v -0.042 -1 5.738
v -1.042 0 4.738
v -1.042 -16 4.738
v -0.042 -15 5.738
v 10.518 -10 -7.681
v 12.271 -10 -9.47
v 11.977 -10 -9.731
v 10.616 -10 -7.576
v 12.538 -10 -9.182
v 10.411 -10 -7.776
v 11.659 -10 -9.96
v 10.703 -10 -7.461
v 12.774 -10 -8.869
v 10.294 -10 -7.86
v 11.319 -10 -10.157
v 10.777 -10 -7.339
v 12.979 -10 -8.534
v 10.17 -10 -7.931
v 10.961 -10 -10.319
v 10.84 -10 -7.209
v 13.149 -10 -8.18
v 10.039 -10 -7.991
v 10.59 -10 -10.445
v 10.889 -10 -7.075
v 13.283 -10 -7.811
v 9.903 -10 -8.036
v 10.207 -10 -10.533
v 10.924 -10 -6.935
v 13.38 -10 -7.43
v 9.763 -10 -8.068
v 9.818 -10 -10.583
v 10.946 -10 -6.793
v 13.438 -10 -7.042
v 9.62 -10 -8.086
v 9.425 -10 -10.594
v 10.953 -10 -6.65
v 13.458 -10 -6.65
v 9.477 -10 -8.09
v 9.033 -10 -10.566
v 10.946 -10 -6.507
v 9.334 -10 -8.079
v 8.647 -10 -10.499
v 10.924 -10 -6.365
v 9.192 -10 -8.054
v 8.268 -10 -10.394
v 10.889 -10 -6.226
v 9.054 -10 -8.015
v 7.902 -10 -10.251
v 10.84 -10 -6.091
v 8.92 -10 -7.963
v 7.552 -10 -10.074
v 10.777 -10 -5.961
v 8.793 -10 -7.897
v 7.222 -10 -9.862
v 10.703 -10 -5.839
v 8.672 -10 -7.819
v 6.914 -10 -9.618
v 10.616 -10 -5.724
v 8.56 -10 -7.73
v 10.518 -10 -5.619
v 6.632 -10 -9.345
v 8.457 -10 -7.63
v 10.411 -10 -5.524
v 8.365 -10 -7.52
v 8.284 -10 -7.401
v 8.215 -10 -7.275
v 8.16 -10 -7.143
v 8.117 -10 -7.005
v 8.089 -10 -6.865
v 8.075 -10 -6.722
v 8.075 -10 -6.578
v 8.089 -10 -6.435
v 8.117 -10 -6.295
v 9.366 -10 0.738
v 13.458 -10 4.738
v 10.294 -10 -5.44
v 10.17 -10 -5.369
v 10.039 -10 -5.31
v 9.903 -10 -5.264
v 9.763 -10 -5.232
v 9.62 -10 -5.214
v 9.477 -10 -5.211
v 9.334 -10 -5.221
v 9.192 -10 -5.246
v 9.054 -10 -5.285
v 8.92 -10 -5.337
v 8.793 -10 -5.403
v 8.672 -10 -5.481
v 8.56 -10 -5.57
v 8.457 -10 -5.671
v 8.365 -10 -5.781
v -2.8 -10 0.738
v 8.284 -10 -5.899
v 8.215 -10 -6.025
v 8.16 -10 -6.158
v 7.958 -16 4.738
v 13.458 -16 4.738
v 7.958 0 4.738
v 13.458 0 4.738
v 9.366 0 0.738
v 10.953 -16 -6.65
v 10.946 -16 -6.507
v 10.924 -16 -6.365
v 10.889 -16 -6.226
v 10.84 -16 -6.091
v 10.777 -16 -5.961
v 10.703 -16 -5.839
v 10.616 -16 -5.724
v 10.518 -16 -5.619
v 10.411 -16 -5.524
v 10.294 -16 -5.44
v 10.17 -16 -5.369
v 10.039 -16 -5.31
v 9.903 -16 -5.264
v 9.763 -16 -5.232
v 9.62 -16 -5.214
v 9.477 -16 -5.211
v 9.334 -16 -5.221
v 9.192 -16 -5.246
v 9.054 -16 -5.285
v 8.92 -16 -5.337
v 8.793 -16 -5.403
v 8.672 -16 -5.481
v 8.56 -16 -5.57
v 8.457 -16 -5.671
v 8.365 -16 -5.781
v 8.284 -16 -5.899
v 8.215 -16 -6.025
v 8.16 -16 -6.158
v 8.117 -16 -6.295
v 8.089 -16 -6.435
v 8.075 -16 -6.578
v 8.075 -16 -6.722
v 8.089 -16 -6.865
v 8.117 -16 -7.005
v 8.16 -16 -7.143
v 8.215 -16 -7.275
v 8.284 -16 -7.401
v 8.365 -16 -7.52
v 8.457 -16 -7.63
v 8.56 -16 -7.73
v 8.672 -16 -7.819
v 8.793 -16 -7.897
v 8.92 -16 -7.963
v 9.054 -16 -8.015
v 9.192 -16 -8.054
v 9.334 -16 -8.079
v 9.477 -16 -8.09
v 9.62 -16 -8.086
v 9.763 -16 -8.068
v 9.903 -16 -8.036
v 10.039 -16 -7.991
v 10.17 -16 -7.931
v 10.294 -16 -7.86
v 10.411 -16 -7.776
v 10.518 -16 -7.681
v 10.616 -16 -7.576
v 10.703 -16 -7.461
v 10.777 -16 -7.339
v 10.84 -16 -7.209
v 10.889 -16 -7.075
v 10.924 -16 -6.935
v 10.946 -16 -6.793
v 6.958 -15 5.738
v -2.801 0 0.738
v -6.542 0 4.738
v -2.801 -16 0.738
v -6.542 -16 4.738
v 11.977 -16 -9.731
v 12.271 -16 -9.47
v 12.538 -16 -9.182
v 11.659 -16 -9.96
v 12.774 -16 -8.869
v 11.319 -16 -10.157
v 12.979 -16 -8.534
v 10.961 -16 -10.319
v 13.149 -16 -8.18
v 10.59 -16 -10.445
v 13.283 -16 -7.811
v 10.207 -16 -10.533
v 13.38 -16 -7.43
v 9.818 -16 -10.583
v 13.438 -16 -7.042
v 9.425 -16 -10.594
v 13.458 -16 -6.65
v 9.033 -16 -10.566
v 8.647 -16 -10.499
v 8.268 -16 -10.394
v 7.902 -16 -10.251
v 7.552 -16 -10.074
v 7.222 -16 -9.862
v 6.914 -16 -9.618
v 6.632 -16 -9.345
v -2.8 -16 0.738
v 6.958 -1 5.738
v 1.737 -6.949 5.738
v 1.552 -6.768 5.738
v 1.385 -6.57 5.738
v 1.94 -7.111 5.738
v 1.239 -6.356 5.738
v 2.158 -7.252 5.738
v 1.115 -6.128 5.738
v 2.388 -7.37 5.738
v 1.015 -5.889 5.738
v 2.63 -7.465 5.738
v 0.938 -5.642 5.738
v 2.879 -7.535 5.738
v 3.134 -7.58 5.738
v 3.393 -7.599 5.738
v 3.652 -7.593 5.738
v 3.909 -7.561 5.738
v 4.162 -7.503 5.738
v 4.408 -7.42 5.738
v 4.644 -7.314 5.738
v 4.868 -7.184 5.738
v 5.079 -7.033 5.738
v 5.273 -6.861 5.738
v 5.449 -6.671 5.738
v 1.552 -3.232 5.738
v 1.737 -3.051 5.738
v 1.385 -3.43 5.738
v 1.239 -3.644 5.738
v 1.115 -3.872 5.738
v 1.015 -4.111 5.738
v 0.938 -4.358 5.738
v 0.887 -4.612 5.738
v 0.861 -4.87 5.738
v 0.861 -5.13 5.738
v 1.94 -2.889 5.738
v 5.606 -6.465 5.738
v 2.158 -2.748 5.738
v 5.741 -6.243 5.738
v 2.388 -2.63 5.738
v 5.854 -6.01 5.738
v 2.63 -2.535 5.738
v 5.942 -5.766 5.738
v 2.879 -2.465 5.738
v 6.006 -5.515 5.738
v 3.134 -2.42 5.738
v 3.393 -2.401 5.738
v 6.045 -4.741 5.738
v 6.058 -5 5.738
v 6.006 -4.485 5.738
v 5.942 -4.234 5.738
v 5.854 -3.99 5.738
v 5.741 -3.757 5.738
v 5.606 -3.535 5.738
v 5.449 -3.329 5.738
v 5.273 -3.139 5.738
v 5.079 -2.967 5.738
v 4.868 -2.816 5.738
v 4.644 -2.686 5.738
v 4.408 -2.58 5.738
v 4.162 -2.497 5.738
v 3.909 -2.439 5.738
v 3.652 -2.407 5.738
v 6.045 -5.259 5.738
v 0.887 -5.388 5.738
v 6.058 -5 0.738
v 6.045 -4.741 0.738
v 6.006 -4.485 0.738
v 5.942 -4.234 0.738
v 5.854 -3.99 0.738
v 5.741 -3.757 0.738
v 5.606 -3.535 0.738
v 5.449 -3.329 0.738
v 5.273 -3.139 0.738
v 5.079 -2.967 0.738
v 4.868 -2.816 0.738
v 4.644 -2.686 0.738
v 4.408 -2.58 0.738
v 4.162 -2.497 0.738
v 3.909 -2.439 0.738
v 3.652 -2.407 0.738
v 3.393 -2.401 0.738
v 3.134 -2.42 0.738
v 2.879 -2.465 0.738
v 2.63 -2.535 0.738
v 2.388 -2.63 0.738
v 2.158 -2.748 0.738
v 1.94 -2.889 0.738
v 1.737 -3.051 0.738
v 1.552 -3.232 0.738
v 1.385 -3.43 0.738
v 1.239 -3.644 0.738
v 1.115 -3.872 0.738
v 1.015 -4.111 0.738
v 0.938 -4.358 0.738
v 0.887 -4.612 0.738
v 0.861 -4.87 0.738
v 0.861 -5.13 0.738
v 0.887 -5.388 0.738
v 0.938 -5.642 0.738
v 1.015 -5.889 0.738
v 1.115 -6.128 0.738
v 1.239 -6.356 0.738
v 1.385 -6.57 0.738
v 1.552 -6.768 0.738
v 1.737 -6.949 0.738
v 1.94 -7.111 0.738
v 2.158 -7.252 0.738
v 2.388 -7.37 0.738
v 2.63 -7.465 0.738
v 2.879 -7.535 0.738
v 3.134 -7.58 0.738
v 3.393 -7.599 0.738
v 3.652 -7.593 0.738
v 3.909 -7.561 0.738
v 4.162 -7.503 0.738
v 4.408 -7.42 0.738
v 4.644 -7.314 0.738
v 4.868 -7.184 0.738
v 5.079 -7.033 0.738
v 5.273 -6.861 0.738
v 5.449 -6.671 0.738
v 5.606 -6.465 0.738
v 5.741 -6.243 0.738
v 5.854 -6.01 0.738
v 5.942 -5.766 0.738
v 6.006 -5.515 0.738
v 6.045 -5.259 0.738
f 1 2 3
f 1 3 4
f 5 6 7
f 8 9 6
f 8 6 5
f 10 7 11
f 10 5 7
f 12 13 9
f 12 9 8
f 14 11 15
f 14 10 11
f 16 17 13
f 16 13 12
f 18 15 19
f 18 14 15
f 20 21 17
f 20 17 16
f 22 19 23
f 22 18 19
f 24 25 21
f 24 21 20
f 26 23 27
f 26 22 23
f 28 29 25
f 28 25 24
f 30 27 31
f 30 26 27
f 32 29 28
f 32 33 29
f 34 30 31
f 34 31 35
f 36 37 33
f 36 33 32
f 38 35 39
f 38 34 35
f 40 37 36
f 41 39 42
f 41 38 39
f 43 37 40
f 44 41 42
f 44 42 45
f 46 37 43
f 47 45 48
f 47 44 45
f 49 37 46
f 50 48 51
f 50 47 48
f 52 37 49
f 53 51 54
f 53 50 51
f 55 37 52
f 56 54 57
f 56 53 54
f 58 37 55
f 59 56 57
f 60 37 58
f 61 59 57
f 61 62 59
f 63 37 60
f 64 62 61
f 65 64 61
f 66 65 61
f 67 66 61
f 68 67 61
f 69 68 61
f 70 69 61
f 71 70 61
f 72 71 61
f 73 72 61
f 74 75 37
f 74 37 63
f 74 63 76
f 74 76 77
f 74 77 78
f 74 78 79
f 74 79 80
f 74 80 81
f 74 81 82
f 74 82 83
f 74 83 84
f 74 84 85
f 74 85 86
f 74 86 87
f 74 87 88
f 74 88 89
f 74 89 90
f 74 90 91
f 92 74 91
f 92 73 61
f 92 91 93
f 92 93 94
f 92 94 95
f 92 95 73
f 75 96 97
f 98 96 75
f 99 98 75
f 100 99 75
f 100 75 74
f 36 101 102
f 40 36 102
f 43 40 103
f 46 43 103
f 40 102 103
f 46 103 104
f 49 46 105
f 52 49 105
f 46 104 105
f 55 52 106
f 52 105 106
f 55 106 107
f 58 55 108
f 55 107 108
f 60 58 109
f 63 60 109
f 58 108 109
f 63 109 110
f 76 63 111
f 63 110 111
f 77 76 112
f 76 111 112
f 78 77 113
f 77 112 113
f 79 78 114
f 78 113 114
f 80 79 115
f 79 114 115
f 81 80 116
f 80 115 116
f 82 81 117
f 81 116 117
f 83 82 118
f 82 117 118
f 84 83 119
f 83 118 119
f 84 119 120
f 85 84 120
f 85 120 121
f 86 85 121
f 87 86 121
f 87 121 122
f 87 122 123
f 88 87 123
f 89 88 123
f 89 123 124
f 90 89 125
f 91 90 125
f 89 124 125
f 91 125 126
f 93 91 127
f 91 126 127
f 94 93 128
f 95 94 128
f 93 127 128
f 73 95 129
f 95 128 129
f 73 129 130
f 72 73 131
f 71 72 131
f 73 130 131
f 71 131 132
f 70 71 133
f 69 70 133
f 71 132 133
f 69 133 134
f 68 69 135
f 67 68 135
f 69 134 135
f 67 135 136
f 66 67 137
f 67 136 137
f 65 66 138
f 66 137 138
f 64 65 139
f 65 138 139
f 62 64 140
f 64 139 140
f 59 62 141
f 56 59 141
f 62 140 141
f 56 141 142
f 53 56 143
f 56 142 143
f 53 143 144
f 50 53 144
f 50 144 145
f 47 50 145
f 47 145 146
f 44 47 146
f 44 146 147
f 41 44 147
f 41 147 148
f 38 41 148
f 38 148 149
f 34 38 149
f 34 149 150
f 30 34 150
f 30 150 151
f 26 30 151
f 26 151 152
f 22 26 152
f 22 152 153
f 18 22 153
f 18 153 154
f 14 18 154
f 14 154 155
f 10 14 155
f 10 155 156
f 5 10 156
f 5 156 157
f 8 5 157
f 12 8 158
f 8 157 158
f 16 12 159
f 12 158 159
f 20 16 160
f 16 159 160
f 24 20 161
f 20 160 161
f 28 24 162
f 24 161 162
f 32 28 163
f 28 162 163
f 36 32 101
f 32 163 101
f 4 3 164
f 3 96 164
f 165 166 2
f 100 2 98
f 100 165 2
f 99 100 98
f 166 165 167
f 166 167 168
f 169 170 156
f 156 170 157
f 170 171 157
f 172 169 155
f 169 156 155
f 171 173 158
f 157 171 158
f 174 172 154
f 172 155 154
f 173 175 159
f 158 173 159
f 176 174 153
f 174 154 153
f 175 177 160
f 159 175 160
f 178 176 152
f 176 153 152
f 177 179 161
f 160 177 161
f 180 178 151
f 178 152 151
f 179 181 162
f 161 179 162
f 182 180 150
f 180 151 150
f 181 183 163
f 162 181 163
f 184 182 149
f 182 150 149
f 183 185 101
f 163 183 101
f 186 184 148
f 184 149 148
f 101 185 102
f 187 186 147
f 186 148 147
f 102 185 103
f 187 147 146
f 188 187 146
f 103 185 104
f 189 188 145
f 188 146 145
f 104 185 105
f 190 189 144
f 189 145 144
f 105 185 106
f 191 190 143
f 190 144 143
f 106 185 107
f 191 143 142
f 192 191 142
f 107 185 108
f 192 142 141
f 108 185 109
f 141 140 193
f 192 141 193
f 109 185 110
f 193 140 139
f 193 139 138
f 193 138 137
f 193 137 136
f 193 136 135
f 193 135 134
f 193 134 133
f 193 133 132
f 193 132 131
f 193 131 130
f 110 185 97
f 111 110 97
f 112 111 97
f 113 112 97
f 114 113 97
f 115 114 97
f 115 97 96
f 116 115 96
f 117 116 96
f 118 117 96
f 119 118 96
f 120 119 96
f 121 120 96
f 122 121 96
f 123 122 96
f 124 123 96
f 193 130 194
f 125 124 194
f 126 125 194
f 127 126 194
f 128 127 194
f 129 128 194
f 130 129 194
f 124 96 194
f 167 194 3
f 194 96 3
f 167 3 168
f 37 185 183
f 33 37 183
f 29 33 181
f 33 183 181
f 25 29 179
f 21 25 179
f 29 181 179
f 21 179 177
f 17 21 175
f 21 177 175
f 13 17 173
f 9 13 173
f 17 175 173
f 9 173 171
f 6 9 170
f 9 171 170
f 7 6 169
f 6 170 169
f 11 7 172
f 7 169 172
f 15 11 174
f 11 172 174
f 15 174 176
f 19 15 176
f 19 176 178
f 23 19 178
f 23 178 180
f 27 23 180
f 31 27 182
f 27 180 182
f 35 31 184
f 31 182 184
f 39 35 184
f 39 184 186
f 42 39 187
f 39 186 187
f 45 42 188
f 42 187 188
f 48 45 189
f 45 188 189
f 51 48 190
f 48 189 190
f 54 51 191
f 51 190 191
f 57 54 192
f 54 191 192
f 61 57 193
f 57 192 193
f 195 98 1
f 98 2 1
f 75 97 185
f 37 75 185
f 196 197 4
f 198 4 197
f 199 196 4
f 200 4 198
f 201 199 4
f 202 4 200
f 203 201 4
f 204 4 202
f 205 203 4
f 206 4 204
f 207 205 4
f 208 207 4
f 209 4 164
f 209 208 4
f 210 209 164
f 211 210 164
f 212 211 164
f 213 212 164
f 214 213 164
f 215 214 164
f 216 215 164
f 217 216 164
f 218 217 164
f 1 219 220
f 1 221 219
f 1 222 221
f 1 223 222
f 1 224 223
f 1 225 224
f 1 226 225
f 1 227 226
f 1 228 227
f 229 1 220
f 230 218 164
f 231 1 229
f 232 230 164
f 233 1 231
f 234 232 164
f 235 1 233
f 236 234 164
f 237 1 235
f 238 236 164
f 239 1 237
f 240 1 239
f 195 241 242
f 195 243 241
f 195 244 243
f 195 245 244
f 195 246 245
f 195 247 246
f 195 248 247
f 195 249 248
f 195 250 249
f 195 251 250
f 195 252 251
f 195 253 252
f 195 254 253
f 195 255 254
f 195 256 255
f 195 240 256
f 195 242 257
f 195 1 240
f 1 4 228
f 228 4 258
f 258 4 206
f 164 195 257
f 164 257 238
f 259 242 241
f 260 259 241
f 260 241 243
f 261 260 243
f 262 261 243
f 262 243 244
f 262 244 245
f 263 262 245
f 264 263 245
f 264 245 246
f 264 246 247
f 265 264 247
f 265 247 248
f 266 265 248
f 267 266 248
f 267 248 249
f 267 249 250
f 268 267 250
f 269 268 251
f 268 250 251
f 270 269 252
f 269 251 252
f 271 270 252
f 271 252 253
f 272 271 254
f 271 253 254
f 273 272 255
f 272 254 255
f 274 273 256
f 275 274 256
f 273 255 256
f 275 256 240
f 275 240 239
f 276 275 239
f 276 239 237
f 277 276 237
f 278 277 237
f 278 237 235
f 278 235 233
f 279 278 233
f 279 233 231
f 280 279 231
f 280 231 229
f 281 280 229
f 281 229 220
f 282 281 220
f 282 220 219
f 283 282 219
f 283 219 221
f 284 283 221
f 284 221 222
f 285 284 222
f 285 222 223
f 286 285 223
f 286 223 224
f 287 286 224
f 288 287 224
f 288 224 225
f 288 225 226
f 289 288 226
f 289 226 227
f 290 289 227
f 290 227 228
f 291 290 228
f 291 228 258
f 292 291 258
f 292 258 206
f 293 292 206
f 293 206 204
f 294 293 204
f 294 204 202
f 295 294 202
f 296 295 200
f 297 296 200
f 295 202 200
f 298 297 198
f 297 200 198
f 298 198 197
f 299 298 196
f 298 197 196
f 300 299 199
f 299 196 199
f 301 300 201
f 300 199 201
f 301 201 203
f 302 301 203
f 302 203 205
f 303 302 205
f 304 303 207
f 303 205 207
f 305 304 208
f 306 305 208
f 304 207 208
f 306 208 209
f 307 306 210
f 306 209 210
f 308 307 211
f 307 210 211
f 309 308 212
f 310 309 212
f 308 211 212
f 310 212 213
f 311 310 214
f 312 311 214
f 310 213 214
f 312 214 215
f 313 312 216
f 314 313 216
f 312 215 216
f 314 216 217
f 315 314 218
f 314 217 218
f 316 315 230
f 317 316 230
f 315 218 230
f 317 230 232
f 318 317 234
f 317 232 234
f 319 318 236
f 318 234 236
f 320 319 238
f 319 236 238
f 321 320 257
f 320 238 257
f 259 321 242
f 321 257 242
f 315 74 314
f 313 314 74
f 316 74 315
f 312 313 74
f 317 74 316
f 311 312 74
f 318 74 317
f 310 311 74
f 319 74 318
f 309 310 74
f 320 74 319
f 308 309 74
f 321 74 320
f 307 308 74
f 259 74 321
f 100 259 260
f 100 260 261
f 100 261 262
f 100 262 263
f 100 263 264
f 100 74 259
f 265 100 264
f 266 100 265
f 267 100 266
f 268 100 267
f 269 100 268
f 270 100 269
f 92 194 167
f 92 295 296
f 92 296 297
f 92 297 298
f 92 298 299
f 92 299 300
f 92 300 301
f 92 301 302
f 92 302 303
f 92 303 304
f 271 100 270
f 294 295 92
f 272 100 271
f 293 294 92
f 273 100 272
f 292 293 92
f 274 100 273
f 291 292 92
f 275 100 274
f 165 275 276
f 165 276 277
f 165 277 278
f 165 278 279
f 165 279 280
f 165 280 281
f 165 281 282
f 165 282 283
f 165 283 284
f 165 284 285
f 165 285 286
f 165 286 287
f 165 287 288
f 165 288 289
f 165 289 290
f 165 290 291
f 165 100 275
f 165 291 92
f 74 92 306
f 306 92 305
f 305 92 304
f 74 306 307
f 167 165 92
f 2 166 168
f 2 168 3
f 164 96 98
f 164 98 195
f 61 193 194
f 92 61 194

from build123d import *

# Parameters (mm, degrees)
BOSS_EXTRUDE1_DEPTH = 16
SKETCH2_W           = 9
SKETCH2_H           = 16
BOSS_EXTRUDE2_DEPTH = 1
BOSS_EXTRUDE2_TAPER = 45
SKETCH3_R           = 2.6
CUT_EXTRUDE1_DEPTH  = 6
SKETCH4_R           = 1.44
BOSS_EXTRUDE3_DEPTH = 6


with BuildPart() as part:
    # Sketch1 → Boss-Extrude1 (new body)
    with BuildSketch(Plane(origin=(0, 0, 0), x_dir=(1, 0, 0), z_dir=(0, 1, 0))):
        Polygon((-6.542273602, -4.737945966), (13.457726398, -4.737945966), (9.36611498, -0.737945966), (-2.80088502, -0.737945966), align=None)
    extrude(amount=-BOSS_EXTRUDE1_DEPTH)

    # Sketch2 → Boss-Extrude2 (add)
    with BuildSketch(Plane.XY.offset(4.737945966)):
        with Locations((3.457726398, -8)):
            Rectangle(SKETCH2_W, SKETCH2_H)
    extrude(amount=BOSS_EXTRUDE2_DEPTH, taper=BOSS_EXTRUDE2_TAPER)

    # Sketch3 → Cut-Extrude1 (cut, through all)
    with BuildSketch(Plane.XY.offset(5.737945966)):
        with Locations((3.457726398, -5)):
            Circle(SKETCH3_R)
    extrude(amount=-CUT_EXTRUDE1_DEPTH, mode=Mode.SUBTRACT)

    # Sketch4 → Boss-Extrude3 (add)
    with BuildSketch(Plane.XZ.offset(16)):
        with BuildLine():
            Line((13.457726398, 4.737945966), (13.457726398, -6.650054034))
            ThreePointArc((13.457726398, -6.650054034), (10.961456039, -10.319414663), (6.631765726, -9.345066204))
            Line((6.631765726, -9.345066204), (-6.542273602, 4.737945966))
            Line((-6.542273602, 4.737945966), (13.457726398, 4.737945966))
        make_face()
        with Locations((9.512726398, -6.650054034)):
            Circle(SKETCH4_R, mode=Mode.SUBTRACT)
    extrude(amount=-BOSS_EXTRUDE3_DEPTH)


solid = part.part
